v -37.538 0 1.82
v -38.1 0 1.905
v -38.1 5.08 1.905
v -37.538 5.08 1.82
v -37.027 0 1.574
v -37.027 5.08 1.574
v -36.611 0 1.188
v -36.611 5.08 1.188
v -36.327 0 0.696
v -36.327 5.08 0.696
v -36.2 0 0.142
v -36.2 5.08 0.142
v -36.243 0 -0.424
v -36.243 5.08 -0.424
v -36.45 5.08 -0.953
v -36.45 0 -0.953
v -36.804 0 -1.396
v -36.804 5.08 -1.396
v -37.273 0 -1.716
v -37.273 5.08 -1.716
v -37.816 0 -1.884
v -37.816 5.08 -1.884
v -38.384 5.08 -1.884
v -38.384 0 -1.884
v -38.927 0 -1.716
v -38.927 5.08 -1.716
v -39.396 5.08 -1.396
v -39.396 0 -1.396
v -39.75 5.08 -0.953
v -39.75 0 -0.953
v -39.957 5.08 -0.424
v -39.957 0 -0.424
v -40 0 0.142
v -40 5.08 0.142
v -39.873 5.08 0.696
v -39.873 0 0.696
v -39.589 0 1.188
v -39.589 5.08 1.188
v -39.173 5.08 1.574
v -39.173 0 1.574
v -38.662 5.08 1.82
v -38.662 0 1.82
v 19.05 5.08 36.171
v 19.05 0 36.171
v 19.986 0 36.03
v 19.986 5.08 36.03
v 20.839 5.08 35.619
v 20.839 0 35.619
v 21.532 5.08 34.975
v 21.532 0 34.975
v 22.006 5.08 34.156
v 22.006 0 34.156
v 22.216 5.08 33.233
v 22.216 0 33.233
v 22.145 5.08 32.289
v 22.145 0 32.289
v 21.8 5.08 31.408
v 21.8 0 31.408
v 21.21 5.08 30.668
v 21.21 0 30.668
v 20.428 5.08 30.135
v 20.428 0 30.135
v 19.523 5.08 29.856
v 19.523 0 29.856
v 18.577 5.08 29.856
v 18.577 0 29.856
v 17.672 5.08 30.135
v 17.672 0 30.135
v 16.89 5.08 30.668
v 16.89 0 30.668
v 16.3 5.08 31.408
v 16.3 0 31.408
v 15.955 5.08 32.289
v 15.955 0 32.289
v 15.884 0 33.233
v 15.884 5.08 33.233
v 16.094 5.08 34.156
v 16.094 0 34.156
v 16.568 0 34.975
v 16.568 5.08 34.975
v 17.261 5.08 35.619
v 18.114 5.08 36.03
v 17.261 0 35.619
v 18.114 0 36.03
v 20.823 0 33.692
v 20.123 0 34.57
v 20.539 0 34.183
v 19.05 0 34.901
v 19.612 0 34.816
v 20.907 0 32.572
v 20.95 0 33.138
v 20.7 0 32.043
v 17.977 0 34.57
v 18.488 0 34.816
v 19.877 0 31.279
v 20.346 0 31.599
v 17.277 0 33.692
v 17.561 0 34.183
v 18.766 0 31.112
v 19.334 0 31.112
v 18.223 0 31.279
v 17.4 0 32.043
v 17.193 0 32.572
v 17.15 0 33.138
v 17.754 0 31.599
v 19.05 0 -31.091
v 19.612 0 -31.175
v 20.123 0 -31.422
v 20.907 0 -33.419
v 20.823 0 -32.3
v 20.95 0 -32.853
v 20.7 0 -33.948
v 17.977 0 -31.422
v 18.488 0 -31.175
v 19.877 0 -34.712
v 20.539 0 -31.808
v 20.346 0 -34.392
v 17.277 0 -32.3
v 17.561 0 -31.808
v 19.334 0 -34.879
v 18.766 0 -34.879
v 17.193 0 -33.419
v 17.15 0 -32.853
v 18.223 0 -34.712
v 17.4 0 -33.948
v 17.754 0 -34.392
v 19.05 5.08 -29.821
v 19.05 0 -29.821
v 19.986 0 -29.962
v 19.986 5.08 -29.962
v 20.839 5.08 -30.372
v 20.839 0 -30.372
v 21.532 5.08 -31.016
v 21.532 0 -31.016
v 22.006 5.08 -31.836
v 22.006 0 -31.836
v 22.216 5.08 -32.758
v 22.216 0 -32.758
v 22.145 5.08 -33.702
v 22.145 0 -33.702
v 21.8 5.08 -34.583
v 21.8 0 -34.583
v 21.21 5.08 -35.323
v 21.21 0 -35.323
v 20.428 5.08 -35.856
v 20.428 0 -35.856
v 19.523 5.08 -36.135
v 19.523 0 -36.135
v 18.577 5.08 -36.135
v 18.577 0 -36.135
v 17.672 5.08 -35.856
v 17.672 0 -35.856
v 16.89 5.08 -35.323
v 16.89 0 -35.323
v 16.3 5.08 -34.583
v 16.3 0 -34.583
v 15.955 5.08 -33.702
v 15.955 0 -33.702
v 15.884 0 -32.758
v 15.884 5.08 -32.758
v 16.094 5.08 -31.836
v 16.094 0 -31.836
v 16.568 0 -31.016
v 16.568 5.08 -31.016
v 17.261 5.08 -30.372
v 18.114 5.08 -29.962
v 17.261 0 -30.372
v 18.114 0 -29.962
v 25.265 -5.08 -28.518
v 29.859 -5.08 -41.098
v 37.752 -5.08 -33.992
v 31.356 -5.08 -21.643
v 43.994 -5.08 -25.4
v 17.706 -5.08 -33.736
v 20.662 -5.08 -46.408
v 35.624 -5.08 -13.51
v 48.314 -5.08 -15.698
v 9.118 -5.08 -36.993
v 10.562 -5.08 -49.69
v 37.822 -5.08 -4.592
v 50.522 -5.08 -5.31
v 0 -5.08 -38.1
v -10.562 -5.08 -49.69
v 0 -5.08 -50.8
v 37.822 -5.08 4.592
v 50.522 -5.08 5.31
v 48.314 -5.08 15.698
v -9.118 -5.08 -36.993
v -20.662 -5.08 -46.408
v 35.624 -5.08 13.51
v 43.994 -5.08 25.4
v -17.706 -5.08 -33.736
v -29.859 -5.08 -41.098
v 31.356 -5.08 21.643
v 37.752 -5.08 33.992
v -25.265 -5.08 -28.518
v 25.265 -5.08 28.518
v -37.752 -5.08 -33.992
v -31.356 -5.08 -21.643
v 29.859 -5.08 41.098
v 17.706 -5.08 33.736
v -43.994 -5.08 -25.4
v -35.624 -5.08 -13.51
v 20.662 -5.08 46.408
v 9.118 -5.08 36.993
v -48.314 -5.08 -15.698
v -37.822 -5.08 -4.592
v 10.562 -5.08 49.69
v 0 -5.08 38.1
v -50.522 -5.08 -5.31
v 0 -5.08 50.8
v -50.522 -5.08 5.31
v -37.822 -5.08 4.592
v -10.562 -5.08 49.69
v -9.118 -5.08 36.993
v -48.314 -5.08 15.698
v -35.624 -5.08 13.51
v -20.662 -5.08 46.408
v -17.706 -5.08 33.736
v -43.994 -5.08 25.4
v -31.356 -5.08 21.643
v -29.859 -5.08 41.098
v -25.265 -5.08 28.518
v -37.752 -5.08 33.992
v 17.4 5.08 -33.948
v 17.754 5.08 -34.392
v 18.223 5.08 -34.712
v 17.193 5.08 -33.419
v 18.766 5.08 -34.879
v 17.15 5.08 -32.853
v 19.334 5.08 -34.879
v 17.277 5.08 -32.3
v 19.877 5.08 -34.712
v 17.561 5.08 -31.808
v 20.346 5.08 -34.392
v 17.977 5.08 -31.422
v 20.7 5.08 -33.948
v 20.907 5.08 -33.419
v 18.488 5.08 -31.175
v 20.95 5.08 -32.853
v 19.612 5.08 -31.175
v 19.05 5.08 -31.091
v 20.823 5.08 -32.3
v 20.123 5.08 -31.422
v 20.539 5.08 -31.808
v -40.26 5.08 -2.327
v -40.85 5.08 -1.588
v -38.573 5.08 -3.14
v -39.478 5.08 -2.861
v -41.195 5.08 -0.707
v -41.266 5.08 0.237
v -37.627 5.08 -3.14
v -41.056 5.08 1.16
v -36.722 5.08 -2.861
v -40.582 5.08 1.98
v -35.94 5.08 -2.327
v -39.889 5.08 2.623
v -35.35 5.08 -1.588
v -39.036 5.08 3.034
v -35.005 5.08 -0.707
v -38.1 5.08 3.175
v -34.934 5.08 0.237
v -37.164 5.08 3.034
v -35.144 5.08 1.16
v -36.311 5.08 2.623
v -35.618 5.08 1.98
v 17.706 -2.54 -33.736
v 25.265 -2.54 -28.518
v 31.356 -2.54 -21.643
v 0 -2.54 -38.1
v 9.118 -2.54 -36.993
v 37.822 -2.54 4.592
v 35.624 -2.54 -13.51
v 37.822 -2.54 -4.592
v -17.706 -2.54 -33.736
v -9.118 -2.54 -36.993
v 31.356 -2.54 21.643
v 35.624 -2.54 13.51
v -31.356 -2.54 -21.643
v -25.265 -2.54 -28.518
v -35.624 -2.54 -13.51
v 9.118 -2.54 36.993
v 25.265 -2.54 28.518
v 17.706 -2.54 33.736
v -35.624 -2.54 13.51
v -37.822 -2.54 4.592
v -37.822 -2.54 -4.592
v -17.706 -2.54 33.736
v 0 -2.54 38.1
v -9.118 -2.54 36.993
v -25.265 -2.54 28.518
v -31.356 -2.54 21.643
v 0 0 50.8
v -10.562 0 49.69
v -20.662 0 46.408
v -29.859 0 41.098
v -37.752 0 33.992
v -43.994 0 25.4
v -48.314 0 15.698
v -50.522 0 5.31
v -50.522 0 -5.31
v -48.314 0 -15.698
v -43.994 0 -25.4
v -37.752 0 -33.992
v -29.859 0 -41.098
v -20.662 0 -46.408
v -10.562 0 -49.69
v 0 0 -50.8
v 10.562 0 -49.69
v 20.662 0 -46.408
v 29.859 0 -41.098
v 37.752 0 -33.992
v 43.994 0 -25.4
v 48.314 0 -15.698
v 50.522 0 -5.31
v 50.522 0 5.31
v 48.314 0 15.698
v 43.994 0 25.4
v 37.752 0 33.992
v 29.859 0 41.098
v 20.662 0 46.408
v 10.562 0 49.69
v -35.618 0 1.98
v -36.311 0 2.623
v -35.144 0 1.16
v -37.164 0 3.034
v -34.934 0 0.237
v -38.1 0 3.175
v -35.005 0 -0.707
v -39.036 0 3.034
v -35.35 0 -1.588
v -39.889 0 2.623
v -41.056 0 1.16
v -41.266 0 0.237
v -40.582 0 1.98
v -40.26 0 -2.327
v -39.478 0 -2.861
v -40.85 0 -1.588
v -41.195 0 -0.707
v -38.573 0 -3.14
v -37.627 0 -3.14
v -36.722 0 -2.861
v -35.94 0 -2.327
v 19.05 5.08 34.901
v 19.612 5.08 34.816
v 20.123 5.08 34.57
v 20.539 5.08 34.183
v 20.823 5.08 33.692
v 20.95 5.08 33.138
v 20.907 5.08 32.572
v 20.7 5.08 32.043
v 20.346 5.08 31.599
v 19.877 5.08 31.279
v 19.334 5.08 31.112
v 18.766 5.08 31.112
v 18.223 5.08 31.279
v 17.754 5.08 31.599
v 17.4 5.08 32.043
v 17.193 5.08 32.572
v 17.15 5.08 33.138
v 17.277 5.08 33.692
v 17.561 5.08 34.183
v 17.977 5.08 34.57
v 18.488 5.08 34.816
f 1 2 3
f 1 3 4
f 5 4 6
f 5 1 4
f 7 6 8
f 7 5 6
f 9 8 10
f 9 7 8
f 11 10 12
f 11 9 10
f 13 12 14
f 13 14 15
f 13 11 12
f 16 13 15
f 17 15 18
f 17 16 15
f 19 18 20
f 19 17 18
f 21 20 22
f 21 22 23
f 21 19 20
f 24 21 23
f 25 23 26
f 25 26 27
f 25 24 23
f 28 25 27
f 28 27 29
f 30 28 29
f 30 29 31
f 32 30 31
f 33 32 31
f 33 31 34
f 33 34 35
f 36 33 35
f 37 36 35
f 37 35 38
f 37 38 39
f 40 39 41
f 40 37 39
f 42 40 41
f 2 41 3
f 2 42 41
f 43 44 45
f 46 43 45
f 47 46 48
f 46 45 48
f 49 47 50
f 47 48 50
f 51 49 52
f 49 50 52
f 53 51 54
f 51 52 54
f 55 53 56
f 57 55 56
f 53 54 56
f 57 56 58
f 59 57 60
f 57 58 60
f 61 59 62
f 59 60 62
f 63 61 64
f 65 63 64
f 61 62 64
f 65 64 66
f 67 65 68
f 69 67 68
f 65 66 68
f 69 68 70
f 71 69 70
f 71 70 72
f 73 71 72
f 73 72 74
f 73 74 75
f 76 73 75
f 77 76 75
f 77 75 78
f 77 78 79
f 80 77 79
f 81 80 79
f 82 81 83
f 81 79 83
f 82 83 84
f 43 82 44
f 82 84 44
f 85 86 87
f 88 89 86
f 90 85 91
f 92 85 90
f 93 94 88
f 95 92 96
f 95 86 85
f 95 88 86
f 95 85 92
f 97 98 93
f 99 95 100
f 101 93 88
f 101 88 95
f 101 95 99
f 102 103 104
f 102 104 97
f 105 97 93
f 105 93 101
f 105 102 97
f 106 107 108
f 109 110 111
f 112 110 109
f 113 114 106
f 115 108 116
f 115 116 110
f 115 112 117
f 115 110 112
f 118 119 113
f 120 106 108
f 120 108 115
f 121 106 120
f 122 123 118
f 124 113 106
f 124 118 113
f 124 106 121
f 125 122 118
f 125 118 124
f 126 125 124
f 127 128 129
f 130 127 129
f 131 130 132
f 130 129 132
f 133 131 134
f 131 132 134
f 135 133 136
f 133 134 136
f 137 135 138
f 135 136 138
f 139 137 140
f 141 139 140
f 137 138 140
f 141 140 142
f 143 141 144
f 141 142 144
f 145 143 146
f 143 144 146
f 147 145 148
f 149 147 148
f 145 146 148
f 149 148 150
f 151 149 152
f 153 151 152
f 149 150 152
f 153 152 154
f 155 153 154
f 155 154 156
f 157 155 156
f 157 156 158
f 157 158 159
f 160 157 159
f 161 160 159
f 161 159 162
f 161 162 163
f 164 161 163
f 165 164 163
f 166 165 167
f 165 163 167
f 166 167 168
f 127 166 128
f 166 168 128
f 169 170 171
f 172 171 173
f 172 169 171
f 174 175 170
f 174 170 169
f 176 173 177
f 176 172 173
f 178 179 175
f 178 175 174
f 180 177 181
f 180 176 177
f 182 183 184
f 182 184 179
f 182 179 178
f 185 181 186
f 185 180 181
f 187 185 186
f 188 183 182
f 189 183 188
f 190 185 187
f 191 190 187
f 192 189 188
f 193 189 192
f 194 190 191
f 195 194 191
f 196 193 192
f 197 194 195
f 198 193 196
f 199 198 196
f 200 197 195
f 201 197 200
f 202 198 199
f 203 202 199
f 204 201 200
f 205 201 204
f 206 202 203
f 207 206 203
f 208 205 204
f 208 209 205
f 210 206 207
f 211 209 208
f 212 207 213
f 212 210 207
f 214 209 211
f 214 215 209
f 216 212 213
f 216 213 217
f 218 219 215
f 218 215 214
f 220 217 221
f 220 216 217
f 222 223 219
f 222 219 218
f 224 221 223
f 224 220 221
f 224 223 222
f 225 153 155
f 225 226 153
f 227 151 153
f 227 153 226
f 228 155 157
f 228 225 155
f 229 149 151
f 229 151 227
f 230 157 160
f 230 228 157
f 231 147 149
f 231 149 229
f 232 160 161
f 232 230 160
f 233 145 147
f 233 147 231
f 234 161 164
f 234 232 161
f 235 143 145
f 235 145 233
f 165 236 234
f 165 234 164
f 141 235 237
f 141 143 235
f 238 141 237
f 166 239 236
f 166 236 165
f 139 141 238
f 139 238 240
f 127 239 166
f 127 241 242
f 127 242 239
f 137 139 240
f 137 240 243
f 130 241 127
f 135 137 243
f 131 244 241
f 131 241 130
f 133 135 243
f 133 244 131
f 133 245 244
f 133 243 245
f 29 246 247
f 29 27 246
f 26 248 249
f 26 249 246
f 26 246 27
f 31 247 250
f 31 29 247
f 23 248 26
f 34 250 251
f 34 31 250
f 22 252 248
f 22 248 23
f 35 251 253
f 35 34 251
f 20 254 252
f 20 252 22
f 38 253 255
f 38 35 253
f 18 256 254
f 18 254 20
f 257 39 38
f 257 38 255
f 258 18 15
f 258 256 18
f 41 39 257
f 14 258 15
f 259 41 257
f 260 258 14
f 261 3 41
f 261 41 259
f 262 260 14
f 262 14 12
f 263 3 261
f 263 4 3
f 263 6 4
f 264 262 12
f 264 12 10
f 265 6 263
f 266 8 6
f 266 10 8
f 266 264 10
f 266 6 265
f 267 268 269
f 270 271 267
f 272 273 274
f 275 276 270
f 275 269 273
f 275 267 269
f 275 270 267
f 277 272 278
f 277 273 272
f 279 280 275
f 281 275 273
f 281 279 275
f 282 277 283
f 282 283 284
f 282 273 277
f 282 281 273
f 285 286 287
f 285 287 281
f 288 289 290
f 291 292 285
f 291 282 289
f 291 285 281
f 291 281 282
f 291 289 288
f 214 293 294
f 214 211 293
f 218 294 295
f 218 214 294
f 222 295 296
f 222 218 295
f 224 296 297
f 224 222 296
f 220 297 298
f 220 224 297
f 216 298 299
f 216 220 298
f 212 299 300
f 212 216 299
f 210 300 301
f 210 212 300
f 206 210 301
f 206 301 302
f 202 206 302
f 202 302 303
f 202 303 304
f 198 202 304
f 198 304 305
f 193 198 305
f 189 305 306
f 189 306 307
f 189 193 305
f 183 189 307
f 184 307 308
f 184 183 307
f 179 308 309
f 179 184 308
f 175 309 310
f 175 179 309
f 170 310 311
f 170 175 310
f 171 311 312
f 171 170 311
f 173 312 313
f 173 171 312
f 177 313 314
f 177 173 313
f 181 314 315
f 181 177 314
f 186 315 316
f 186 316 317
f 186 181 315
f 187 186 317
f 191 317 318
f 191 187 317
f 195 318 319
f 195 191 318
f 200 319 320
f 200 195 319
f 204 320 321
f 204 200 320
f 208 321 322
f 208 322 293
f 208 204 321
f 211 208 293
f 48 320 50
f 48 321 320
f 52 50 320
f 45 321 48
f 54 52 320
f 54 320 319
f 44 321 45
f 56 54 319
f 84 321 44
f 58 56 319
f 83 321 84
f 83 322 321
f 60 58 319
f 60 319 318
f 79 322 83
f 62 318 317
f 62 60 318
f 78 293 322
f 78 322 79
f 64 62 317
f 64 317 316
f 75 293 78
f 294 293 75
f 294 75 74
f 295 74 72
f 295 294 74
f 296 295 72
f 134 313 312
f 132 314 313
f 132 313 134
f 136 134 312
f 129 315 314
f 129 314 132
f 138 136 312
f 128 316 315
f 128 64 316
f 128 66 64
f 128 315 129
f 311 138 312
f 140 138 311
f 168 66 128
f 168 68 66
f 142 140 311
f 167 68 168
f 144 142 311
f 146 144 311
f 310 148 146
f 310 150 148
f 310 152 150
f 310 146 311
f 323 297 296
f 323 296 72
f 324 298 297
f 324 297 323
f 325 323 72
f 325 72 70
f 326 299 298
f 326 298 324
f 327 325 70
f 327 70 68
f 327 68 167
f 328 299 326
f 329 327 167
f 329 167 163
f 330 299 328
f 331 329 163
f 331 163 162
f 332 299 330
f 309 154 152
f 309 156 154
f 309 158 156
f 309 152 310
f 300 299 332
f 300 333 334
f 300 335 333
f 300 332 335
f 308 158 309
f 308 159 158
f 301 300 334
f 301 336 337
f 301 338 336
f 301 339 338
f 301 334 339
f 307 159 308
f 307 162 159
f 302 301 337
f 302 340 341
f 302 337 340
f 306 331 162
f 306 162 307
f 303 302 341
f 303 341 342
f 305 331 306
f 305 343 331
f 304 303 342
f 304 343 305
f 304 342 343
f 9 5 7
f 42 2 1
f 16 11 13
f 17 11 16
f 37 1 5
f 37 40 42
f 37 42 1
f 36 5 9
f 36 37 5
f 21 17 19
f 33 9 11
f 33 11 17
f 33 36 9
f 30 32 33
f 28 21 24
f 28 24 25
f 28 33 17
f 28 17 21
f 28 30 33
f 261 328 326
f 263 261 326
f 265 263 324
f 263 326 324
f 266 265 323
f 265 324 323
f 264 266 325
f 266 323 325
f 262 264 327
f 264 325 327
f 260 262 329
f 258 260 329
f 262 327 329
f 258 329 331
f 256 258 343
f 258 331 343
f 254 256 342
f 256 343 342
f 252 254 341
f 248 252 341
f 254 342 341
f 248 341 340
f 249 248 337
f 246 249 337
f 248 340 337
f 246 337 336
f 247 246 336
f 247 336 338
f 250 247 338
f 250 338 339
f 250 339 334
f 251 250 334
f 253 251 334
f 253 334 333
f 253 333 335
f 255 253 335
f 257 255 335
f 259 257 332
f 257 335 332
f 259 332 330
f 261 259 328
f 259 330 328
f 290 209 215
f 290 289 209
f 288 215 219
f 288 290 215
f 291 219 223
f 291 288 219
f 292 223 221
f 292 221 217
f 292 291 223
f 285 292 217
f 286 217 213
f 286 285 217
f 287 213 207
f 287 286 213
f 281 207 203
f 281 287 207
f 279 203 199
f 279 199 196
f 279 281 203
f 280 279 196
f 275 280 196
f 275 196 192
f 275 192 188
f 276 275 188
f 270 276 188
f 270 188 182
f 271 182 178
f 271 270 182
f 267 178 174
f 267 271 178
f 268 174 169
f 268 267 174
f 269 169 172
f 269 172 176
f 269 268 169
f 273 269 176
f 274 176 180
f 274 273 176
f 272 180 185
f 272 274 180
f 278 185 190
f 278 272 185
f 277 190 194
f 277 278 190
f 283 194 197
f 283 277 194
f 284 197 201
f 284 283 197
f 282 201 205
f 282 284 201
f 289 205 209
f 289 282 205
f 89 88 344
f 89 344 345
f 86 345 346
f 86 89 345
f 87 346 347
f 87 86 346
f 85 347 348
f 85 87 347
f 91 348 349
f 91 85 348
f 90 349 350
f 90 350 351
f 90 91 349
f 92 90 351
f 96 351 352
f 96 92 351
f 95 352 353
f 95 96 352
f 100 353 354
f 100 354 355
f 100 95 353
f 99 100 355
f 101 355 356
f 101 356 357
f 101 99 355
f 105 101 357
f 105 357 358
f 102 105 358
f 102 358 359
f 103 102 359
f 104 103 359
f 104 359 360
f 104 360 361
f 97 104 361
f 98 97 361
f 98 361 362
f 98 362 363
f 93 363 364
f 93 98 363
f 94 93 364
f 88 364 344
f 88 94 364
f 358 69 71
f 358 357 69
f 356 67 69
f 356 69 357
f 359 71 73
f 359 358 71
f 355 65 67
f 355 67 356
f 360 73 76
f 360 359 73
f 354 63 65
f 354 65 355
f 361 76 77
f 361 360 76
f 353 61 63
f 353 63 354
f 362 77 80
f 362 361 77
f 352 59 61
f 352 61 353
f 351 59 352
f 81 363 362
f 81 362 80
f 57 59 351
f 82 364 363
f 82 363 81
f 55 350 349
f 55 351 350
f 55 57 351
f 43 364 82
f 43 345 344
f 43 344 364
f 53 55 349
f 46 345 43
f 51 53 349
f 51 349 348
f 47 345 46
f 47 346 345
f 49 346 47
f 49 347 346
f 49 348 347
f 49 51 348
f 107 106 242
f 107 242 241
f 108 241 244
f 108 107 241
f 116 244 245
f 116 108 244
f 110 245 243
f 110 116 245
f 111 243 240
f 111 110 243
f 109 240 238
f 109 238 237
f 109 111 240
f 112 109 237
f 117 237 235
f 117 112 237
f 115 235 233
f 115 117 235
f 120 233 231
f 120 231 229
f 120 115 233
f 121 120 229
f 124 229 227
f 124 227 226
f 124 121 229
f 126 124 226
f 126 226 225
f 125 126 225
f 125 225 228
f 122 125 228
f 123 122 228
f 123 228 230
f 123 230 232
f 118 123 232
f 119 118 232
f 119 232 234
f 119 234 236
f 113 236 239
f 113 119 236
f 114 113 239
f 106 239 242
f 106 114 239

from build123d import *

# Parameters (mm, degrees)
SKETCH3_R           = 3.175
SKETCH3_R_2         = 1.905
BOSS_EXTRUDE1_DEPTH = 5.08


with BuildPart() as part:
    # Sketch1 → Revolve1 (revolve)
    with BuildSketch(Plane.XY, mode=Mode.PRIVATE) as revolve1_sk:
        Polygon((-38.1, -2.54), (0, -2.54), (0, 0), (-50.8, 0), (-50.8, -5.08), (-38.1, -5.08), align=None)
    revolve(revolve1_sk.sketch.rotate(Axis((0, 4.567685351, 0), (0, -1, 0)), 270), axis=Axis((0, 4.567685351, 0), (0, -1, 0)))

    # Sketch3 → Boss-Extrude1 (add)
    # profile 1 of 3: a face of its own
    with BuildSketch(Plane(origin=(0, 0, 0), x_dir=(1, 0, 0), z_dir=(0, 1, 0))):
        with Locations(Location((-38.1, 0, 0), (0, 0, 270))):
            Circle(SKETCH3_R)
        with Locations(Location((-38.1, 0, 0), (0, 0, 270))):
            Circle(SKETCH3_R_2, mode=Mode.SUBTRACT)
    # profile 2 of 3: a face of its own
    with BuildSketch(Plane(origin=(0, 0, 0), x_dir=(1, 0, 0), z_dir=(0, 1, 0))):
        with Locations(Location((19.05, 32.995567884, 0), (0, 0, 270))):
            Circle(SKETCH3_R)
        with Locations(Location((19.05, 32.995567884, 0), (0, 0, 270))):
            Circle(SKETCH3_R_2, mode=Mode.SUBTRACT)
    # profile 3 of 3: a face of its own
    with BuildSketch(Plane(origin=(0, 0, 0), x_dir=(1, 0, 0), z_dir=(0, 1, 0))):
        with Locations(Location((19.05, -32.995567884, 0), (0, 0, 270))):
            Circle(SKETCH3_R)
        with Locations(Location((19.05, -32.995567884, 0), (0, 0, 270))):
            Circle(SKETCH3_R_2, mode=Mode.SUBTRACT)
    extrude(amount=BOSS_EXTRUDE1_DEPTH)


solid = part.part
